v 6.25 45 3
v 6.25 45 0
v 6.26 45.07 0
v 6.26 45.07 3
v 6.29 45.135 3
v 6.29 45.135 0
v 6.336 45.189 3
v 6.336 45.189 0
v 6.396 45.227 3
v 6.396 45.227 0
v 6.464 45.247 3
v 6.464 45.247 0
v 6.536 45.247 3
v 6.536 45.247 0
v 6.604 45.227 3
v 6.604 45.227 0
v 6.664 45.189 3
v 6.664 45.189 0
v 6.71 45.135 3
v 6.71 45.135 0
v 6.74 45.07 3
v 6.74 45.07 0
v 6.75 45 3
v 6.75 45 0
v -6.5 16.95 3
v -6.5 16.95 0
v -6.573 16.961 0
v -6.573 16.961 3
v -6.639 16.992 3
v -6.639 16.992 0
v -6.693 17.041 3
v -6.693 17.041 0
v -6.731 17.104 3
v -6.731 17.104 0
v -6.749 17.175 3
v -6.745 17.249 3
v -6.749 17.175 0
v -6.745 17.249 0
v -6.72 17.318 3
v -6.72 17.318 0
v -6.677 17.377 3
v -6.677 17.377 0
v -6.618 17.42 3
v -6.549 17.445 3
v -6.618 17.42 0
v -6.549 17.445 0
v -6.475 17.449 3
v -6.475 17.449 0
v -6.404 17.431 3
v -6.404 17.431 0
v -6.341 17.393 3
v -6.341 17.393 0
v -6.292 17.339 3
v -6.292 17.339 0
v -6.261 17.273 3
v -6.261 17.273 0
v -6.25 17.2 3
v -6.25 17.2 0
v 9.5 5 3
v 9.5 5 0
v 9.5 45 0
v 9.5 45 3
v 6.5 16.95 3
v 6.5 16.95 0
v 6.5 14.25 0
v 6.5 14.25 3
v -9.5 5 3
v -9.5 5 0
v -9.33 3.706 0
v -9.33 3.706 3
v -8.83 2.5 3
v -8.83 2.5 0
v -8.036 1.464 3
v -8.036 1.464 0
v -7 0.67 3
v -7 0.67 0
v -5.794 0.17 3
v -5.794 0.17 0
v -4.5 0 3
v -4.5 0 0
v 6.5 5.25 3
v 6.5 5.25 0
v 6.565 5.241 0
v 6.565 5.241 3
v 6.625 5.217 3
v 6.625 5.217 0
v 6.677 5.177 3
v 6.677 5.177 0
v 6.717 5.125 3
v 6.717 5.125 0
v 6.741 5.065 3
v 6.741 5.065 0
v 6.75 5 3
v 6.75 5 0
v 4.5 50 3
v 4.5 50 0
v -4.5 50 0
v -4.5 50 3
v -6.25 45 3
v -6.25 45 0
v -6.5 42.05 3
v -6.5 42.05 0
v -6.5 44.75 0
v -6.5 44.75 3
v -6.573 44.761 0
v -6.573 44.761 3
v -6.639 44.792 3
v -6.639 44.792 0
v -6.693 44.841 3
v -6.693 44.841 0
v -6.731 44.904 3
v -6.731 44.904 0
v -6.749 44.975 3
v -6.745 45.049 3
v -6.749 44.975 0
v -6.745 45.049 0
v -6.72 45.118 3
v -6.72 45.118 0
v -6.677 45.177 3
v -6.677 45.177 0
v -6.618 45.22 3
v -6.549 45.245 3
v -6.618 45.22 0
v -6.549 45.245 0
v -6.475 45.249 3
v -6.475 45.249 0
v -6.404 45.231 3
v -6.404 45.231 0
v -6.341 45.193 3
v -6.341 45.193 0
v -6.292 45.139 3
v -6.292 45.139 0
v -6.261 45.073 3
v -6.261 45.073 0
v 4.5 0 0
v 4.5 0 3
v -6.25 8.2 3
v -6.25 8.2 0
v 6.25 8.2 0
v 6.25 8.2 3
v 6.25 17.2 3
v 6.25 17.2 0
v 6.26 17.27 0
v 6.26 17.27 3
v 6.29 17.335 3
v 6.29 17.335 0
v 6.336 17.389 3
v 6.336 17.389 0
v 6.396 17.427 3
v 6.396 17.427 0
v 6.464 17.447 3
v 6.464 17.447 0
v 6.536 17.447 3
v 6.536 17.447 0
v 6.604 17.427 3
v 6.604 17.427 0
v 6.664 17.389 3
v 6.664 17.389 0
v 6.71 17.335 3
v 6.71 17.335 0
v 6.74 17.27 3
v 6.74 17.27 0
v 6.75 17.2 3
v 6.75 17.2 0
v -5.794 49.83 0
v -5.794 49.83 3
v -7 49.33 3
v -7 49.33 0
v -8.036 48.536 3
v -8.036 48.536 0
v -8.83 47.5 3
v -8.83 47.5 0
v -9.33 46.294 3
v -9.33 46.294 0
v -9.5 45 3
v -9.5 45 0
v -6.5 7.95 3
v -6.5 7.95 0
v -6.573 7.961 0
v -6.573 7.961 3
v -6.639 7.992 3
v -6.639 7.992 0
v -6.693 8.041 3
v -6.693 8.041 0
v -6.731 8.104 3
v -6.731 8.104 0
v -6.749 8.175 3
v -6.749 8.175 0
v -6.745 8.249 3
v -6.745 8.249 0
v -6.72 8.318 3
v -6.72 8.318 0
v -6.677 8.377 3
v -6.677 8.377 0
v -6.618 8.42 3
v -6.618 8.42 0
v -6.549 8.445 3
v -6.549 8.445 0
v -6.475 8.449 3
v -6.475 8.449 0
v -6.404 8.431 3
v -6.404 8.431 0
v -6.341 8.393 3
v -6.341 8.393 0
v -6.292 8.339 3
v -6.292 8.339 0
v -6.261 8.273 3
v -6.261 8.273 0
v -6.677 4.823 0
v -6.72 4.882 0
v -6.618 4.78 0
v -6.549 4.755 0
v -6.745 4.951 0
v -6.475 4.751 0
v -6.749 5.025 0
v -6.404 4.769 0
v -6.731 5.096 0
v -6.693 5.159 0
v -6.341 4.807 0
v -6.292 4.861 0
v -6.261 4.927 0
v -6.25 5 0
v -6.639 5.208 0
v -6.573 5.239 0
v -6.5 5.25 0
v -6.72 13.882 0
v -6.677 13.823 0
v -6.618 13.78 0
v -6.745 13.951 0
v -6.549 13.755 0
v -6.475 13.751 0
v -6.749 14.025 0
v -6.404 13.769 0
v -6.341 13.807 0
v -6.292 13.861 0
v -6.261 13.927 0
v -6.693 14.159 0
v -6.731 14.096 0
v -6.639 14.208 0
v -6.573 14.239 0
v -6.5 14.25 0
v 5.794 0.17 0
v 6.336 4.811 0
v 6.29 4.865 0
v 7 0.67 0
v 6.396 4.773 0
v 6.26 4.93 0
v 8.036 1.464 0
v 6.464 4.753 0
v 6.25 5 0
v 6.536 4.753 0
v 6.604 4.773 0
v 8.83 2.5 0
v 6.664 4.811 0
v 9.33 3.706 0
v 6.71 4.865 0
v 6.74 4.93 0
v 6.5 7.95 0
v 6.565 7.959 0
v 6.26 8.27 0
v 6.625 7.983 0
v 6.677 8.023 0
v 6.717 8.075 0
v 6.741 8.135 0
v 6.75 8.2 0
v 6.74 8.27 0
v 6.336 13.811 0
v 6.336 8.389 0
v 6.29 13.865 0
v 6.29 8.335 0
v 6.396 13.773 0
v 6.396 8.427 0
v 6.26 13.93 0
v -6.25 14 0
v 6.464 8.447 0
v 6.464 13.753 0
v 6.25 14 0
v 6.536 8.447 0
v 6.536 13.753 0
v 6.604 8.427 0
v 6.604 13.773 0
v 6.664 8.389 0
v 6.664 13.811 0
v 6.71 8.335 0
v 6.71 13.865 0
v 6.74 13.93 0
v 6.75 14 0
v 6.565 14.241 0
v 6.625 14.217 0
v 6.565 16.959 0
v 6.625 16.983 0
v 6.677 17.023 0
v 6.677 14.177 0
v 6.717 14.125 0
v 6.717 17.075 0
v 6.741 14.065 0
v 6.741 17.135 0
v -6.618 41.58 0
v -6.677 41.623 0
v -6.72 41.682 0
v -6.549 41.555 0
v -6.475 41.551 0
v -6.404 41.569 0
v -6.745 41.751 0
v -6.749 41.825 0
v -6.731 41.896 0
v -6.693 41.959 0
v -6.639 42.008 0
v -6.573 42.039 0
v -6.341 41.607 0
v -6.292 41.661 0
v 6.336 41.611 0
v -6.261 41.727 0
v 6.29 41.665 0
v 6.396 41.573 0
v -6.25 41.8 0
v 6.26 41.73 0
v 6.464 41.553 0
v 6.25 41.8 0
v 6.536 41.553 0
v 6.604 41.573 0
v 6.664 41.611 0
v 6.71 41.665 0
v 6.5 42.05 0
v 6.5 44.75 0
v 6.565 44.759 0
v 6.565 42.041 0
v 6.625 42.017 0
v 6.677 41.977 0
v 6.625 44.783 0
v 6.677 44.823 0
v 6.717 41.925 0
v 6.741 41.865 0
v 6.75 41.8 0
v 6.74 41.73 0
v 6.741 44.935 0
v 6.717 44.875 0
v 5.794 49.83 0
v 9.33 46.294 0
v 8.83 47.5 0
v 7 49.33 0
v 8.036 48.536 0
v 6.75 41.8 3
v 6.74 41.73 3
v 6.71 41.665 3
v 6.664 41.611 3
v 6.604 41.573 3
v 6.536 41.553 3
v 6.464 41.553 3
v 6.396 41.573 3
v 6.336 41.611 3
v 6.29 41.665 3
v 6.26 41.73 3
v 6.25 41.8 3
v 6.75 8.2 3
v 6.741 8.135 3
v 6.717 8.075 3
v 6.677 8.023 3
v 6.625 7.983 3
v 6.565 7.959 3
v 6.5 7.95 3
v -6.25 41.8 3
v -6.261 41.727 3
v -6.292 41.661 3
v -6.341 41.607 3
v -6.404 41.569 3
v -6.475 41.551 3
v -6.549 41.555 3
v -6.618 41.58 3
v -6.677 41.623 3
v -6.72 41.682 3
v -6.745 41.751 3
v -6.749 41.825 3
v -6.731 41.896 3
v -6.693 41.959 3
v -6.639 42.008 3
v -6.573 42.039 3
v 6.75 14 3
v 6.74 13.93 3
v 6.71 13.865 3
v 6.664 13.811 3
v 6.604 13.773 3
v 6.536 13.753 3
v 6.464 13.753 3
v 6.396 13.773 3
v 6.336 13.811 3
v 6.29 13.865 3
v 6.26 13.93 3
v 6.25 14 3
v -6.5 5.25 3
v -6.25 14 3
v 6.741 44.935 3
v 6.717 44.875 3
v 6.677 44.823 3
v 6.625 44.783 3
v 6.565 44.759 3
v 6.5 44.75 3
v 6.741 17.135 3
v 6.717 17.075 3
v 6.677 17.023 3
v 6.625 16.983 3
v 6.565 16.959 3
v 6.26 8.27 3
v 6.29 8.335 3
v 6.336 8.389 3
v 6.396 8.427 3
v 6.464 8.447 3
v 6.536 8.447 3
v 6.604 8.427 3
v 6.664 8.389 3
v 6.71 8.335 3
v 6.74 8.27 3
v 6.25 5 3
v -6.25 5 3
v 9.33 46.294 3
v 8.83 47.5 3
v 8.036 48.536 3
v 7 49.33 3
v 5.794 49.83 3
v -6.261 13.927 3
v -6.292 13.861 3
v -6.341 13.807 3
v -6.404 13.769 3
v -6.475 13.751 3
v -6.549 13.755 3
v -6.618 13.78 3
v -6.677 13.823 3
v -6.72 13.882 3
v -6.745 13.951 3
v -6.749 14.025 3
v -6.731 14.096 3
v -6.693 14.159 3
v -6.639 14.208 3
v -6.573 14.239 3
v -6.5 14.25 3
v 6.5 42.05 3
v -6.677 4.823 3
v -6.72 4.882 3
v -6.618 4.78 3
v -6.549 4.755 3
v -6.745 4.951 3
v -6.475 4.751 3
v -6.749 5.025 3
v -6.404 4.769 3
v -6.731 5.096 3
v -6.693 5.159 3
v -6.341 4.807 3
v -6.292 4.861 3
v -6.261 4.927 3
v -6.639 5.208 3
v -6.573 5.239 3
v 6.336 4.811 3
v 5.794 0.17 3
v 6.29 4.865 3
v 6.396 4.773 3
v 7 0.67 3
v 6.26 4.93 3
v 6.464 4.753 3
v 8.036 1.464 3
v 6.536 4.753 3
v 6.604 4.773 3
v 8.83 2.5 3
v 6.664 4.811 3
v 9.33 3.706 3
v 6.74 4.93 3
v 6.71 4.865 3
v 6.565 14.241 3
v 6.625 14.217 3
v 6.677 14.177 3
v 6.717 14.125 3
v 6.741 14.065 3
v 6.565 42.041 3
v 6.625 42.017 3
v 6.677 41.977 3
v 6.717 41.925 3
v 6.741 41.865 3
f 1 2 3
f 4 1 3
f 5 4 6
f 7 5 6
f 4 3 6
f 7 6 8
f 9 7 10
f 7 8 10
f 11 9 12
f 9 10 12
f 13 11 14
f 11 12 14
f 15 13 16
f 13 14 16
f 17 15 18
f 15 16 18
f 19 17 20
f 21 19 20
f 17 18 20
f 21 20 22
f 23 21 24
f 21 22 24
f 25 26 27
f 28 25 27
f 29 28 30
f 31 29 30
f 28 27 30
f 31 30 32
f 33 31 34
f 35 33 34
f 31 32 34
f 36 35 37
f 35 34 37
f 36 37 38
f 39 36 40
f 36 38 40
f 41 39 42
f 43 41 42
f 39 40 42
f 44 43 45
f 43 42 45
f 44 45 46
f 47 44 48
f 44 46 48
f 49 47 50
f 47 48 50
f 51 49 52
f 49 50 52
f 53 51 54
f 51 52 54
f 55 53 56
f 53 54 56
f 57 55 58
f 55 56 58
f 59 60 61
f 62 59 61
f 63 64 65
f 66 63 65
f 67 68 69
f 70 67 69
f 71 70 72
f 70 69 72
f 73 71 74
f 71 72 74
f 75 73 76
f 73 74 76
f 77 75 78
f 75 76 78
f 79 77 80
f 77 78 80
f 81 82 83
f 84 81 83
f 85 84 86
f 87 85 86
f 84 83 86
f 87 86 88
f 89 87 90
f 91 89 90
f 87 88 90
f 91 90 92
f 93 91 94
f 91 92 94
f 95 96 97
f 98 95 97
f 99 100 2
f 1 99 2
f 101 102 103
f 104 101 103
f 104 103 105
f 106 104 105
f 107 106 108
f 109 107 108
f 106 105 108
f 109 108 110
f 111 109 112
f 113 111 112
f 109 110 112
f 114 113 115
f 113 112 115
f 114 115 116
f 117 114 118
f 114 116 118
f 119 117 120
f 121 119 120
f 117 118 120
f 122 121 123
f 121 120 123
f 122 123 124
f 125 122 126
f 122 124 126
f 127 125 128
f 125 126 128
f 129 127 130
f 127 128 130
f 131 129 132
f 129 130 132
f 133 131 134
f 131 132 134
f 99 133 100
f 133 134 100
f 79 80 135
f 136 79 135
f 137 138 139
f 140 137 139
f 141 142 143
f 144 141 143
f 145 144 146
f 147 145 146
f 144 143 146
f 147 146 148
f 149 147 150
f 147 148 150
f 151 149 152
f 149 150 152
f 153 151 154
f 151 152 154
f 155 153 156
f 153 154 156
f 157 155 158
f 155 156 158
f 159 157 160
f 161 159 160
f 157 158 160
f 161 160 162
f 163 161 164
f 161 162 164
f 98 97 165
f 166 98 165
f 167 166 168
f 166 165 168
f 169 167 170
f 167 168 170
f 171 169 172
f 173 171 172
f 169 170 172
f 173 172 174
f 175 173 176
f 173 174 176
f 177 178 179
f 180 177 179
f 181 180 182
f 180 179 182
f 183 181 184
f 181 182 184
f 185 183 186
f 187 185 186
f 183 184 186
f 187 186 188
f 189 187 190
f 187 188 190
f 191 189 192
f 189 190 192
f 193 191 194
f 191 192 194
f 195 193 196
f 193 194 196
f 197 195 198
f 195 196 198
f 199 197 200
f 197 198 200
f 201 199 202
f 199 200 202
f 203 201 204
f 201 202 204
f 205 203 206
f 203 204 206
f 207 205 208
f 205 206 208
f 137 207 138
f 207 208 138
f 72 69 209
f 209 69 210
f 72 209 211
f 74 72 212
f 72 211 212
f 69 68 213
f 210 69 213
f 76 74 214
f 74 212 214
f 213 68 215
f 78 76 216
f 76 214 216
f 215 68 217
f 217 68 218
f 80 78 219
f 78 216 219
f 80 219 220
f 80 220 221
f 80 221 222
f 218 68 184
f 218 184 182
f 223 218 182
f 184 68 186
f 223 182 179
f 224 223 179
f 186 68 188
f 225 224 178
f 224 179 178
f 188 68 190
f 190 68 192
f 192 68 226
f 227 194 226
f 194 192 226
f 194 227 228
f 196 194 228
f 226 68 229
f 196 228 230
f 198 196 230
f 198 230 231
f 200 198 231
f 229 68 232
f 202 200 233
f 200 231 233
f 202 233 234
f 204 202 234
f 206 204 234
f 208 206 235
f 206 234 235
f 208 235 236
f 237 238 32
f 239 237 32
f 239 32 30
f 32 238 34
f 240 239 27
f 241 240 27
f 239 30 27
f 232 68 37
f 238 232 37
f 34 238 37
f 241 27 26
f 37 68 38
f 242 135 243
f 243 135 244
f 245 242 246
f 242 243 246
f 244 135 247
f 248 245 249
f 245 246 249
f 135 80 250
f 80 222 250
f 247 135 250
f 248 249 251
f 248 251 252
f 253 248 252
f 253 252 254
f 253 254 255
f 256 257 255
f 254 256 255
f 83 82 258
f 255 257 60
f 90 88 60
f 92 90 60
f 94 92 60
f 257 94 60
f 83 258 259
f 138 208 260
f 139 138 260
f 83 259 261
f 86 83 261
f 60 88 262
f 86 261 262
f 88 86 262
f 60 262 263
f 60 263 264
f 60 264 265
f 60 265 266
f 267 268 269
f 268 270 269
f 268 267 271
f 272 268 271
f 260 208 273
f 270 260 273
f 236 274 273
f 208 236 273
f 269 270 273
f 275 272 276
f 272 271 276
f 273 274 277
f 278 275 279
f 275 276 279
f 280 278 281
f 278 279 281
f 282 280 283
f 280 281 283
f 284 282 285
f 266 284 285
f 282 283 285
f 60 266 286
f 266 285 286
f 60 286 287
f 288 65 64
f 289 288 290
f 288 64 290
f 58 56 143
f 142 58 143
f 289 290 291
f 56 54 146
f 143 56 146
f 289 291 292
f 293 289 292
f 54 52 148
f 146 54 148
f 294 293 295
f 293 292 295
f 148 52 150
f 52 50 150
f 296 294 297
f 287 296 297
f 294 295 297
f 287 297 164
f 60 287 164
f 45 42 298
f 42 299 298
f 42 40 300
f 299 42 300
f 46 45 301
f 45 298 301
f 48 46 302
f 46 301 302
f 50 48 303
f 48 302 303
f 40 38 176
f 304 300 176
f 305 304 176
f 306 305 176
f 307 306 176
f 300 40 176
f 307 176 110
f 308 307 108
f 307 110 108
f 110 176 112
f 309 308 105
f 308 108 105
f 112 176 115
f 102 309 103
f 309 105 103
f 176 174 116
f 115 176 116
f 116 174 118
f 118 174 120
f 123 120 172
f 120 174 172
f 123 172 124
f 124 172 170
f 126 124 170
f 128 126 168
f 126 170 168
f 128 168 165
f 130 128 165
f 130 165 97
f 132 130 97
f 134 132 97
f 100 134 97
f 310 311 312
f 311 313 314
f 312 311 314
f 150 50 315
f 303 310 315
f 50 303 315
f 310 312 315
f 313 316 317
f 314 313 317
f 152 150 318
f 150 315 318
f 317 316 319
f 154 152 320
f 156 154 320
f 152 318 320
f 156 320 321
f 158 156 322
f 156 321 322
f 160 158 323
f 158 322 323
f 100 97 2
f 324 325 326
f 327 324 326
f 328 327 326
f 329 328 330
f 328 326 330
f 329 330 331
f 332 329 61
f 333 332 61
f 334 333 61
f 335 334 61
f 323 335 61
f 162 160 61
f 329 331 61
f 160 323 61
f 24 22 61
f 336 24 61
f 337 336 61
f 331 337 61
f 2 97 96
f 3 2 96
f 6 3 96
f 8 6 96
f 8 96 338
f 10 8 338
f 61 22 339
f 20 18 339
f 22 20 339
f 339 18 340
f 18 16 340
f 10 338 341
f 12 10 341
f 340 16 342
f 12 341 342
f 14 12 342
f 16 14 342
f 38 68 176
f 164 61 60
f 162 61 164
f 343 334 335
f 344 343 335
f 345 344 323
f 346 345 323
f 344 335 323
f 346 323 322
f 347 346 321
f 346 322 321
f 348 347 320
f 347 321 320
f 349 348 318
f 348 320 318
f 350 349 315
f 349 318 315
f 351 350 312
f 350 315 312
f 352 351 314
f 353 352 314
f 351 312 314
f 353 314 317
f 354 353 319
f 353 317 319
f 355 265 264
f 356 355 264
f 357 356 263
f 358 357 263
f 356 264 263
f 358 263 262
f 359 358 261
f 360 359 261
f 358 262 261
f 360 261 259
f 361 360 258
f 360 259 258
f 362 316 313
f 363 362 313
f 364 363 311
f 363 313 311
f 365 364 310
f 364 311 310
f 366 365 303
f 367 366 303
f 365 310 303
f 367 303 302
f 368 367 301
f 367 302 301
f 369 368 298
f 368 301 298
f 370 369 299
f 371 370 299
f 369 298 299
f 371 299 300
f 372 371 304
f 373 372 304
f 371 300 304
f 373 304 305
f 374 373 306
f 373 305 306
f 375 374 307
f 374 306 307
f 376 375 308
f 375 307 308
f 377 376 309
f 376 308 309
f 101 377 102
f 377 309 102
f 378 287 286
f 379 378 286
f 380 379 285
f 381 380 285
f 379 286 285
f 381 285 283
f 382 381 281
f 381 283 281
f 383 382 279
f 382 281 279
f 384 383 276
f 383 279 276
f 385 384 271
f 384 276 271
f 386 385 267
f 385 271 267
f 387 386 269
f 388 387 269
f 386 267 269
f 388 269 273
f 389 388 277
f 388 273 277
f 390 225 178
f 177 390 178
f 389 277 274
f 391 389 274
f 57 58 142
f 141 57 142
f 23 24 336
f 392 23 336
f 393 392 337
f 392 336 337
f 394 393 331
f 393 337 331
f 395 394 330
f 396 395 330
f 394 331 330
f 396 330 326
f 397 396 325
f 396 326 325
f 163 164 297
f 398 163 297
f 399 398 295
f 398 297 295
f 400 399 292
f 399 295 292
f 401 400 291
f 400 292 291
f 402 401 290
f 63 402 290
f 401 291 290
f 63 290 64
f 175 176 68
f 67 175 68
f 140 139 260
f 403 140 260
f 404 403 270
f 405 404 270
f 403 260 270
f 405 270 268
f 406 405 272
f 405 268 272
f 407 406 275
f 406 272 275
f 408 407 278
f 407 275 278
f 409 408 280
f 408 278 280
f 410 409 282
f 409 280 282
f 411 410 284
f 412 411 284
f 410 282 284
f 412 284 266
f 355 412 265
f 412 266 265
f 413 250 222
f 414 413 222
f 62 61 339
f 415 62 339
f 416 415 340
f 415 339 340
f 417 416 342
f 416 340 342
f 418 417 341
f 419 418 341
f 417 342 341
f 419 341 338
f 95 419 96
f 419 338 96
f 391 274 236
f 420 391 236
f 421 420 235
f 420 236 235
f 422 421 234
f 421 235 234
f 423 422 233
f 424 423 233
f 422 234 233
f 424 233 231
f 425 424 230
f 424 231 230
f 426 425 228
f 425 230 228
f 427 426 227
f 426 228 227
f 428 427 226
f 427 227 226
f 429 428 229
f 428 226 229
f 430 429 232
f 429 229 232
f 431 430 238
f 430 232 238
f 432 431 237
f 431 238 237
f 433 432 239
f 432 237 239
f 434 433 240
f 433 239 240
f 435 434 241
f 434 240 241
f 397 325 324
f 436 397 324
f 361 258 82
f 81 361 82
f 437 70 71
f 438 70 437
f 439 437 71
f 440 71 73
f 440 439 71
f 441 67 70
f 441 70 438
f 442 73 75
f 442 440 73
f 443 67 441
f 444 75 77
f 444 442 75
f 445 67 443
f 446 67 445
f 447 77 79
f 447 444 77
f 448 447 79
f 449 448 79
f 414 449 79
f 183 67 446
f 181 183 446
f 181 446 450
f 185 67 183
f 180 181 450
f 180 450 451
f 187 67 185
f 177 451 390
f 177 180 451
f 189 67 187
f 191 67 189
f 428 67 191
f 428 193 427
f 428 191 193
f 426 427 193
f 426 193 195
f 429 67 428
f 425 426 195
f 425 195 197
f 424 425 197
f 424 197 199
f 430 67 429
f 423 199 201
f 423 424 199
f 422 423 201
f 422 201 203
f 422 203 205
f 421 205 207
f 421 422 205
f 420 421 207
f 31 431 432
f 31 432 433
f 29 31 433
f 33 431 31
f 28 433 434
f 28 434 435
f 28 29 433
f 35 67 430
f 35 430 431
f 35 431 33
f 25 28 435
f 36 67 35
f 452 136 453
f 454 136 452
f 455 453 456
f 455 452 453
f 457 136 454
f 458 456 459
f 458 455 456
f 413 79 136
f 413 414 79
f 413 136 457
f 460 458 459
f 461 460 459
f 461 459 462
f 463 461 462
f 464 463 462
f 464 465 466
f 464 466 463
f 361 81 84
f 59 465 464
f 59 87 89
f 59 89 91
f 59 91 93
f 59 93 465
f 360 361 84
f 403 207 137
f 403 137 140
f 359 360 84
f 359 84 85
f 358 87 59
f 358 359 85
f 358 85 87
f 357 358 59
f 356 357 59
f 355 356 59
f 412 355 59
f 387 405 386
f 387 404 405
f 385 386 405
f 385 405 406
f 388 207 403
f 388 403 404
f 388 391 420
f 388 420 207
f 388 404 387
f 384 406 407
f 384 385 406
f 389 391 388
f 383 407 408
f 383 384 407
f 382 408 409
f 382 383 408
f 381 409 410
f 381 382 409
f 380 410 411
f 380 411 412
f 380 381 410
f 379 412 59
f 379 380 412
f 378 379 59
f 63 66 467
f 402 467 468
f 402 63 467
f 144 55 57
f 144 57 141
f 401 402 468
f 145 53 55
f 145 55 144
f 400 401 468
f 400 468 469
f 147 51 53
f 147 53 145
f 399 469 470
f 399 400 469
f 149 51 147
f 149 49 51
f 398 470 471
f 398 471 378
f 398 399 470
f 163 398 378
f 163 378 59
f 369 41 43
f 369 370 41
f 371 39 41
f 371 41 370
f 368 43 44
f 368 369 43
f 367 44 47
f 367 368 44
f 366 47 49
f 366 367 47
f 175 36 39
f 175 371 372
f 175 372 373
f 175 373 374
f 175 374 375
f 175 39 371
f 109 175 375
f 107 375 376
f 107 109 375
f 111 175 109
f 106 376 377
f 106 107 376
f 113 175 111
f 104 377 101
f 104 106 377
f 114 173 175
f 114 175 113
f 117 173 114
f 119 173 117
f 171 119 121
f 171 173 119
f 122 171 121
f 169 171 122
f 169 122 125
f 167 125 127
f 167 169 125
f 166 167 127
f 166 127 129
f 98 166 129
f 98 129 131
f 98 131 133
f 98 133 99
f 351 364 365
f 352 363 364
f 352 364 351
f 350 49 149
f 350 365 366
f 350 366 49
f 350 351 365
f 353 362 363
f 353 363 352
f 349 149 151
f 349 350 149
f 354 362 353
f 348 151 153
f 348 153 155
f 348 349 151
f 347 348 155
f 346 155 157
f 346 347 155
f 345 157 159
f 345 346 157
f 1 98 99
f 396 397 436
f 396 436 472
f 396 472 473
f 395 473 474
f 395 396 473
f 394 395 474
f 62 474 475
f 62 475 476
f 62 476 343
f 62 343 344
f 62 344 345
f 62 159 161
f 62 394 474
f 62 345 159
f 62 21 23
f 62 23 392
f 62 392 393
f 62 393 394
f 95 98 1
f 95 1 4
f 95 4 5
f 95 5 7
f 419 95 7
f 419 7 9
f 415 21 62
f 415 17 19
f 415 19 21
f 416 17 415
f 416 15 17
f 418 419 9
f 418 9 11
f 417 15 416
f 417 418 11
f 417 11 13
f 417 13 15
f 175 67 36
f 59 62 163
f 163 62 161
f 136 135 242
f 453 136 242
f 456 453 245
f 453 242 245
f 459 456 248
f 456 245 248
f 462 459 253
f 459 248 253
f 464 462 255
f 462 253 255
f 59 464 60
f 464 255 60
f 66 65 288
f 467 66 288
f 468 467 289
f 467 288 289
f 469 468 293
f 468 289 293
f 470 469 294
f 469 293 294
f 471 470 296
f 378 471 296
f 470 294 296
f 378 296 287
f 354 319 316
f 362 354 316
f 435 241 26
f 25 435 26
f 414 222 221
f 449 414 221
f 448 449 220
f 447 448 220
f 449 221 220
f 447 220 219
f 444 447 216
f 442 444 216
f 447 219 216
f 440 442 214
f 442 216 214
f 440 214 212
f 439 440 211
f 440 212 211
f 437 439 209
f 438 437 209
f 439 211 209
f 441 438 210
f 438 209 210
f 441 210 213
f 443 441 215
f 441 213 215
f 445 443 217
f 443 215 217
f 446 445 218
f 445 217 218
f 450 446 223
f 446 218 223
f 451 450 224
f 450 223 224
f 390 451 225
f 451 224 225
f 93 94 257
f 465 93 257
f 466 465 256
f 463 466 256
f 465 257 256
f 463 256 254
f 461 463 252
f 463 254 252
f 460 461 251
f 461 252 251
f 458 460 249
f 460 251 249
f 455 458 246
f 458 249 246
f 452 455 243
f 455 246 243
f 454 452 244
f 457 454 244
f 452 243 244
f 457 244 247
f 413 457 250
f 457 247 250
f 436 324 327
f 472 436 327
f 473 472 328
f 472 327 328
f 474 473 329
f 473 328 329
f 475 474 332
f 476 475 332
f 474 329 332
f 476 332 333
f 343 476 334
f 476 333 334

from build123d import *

# Parameters (mm, degrees)
F1_DEPTH = 3


with BuildPart() as f1:
    # F0 (on Top) → F1 (new body)
    with BuildSketch(Plane.XY):
        with BuildLine():
            Line((4.5, 50), (-4.5, 50))
            ThreePointArc((-4.5, 50), (-8.035534, 48.535534), (-9.5, 45))
            Line((-9.5, 45), (-9.5, 5))
            ThreePointArc((-9.5, 5), (-8.035534, 1.464466), (-4.5, 0))
            Line((-4.5, 0), (4.5, 0))
            ThreePointArc((4.5, 0), (8.035534, 1.464466), (9.5, 5))
            Line((9.5, 5), (9.5, 45))
            ThreePointArc((9.5, 45), (8.035534, 48.535534), (4.5, 50))
        make_face()
        with BuildLine():
            ThreePointArc((-6.5, 7.95), (-6.676777, 8.376777), (-6.25, 8.2))
            Line((-6.25, 8.2), (6.25, 8.2))
            ThreePointArc((6.25, 8.2), (6.5, 8.45), (6.75, 8.2))
            ThreePointArc((6.75, 8.2), (6.676777, 8.023223), (6.5, 7.95))
            Line((6.5, 7.95), (6.5, 5.25))
            ThreePointArc((6.5, 5.25), (6.676777, 5.176777), (6.75, 5))
            ThreePointArc((6.75, 5), (6.5, 4.75), (6.25, 5))
            Line((6.25, 5), (-6.25, 5))
            ThreePointArc((-6.25, 5), (-6.676777, 4.823223), (-6.5, 5.25))
            Line((-6.5, 5.25), (-6.5, 7.95))
        make_face(mode=Mode.SUBTRACT)
        with BuildLine():
            ThreePointArc((-6.5, 16.95), (-6.676777, 17.376777), (-6.25, 17.2))
            Line((-6.25, 17.2), (6.25, 17.2))
            ThreePointArc((6.25, 17.2), (6.5, 17.45), (6.75, 17.2))
            ThreePointArc((6.75, 17.2), (6.676777, 17.023223), (6.5, 16.95))
            Line((6.5, 16.95), (6.5, 14.25))
            ThreePointArc((6.5, 14.25), (6.676777, 14.176777), (6.75, 14))
            ThreePointArc((6.75, 14), (6.5, 13.75), (6.25, 14))
            Line((6.25, 14), (-6.25, 14))
            ThreePointArc((-6.25, 14), (-6.676777, 13.823223), (-6.5, 14.25))
            Line((-6.5, 14.25), (-6.5, 16.95))
        make_face(mode=Mode.SUBTRACT)
        with BuildLine():
            ThreePointArc((-6.5, 44.75), (-6.676777, 45.176777), (-6.25, 45))
            Line((-6.25, 45), (6.25, 45))
            ThreePointArc((6.25, 45), (6.5, 45.25), (6.75, 45))
            ThreePointArc((6.75, 45), (6.676777, 44.823223), (6.5, 44.75))
            Line((6.5, 44.75), (6.5, 42.05))
            ThreePointArc((6.5, 42.05), (6.676777, 41.976777), (6.75, 41.8))
            ThreePointArc((6.75, 41.8), (6.5, 41.55), (6.25, 41.8))
            Line((6.25, 41.8), (-6.25, 41.8))
            ThreePointArc((-6.25, 41.8), (-6.676777, 41.623223), (-6.5, 42.05))
            Line((-6.5, 42.05), (-6.5, 44.75))
        make_face(mode=Mode.SUBTRACT)
    extrude(amount=F1_DEPTH)


solid = f1.part
